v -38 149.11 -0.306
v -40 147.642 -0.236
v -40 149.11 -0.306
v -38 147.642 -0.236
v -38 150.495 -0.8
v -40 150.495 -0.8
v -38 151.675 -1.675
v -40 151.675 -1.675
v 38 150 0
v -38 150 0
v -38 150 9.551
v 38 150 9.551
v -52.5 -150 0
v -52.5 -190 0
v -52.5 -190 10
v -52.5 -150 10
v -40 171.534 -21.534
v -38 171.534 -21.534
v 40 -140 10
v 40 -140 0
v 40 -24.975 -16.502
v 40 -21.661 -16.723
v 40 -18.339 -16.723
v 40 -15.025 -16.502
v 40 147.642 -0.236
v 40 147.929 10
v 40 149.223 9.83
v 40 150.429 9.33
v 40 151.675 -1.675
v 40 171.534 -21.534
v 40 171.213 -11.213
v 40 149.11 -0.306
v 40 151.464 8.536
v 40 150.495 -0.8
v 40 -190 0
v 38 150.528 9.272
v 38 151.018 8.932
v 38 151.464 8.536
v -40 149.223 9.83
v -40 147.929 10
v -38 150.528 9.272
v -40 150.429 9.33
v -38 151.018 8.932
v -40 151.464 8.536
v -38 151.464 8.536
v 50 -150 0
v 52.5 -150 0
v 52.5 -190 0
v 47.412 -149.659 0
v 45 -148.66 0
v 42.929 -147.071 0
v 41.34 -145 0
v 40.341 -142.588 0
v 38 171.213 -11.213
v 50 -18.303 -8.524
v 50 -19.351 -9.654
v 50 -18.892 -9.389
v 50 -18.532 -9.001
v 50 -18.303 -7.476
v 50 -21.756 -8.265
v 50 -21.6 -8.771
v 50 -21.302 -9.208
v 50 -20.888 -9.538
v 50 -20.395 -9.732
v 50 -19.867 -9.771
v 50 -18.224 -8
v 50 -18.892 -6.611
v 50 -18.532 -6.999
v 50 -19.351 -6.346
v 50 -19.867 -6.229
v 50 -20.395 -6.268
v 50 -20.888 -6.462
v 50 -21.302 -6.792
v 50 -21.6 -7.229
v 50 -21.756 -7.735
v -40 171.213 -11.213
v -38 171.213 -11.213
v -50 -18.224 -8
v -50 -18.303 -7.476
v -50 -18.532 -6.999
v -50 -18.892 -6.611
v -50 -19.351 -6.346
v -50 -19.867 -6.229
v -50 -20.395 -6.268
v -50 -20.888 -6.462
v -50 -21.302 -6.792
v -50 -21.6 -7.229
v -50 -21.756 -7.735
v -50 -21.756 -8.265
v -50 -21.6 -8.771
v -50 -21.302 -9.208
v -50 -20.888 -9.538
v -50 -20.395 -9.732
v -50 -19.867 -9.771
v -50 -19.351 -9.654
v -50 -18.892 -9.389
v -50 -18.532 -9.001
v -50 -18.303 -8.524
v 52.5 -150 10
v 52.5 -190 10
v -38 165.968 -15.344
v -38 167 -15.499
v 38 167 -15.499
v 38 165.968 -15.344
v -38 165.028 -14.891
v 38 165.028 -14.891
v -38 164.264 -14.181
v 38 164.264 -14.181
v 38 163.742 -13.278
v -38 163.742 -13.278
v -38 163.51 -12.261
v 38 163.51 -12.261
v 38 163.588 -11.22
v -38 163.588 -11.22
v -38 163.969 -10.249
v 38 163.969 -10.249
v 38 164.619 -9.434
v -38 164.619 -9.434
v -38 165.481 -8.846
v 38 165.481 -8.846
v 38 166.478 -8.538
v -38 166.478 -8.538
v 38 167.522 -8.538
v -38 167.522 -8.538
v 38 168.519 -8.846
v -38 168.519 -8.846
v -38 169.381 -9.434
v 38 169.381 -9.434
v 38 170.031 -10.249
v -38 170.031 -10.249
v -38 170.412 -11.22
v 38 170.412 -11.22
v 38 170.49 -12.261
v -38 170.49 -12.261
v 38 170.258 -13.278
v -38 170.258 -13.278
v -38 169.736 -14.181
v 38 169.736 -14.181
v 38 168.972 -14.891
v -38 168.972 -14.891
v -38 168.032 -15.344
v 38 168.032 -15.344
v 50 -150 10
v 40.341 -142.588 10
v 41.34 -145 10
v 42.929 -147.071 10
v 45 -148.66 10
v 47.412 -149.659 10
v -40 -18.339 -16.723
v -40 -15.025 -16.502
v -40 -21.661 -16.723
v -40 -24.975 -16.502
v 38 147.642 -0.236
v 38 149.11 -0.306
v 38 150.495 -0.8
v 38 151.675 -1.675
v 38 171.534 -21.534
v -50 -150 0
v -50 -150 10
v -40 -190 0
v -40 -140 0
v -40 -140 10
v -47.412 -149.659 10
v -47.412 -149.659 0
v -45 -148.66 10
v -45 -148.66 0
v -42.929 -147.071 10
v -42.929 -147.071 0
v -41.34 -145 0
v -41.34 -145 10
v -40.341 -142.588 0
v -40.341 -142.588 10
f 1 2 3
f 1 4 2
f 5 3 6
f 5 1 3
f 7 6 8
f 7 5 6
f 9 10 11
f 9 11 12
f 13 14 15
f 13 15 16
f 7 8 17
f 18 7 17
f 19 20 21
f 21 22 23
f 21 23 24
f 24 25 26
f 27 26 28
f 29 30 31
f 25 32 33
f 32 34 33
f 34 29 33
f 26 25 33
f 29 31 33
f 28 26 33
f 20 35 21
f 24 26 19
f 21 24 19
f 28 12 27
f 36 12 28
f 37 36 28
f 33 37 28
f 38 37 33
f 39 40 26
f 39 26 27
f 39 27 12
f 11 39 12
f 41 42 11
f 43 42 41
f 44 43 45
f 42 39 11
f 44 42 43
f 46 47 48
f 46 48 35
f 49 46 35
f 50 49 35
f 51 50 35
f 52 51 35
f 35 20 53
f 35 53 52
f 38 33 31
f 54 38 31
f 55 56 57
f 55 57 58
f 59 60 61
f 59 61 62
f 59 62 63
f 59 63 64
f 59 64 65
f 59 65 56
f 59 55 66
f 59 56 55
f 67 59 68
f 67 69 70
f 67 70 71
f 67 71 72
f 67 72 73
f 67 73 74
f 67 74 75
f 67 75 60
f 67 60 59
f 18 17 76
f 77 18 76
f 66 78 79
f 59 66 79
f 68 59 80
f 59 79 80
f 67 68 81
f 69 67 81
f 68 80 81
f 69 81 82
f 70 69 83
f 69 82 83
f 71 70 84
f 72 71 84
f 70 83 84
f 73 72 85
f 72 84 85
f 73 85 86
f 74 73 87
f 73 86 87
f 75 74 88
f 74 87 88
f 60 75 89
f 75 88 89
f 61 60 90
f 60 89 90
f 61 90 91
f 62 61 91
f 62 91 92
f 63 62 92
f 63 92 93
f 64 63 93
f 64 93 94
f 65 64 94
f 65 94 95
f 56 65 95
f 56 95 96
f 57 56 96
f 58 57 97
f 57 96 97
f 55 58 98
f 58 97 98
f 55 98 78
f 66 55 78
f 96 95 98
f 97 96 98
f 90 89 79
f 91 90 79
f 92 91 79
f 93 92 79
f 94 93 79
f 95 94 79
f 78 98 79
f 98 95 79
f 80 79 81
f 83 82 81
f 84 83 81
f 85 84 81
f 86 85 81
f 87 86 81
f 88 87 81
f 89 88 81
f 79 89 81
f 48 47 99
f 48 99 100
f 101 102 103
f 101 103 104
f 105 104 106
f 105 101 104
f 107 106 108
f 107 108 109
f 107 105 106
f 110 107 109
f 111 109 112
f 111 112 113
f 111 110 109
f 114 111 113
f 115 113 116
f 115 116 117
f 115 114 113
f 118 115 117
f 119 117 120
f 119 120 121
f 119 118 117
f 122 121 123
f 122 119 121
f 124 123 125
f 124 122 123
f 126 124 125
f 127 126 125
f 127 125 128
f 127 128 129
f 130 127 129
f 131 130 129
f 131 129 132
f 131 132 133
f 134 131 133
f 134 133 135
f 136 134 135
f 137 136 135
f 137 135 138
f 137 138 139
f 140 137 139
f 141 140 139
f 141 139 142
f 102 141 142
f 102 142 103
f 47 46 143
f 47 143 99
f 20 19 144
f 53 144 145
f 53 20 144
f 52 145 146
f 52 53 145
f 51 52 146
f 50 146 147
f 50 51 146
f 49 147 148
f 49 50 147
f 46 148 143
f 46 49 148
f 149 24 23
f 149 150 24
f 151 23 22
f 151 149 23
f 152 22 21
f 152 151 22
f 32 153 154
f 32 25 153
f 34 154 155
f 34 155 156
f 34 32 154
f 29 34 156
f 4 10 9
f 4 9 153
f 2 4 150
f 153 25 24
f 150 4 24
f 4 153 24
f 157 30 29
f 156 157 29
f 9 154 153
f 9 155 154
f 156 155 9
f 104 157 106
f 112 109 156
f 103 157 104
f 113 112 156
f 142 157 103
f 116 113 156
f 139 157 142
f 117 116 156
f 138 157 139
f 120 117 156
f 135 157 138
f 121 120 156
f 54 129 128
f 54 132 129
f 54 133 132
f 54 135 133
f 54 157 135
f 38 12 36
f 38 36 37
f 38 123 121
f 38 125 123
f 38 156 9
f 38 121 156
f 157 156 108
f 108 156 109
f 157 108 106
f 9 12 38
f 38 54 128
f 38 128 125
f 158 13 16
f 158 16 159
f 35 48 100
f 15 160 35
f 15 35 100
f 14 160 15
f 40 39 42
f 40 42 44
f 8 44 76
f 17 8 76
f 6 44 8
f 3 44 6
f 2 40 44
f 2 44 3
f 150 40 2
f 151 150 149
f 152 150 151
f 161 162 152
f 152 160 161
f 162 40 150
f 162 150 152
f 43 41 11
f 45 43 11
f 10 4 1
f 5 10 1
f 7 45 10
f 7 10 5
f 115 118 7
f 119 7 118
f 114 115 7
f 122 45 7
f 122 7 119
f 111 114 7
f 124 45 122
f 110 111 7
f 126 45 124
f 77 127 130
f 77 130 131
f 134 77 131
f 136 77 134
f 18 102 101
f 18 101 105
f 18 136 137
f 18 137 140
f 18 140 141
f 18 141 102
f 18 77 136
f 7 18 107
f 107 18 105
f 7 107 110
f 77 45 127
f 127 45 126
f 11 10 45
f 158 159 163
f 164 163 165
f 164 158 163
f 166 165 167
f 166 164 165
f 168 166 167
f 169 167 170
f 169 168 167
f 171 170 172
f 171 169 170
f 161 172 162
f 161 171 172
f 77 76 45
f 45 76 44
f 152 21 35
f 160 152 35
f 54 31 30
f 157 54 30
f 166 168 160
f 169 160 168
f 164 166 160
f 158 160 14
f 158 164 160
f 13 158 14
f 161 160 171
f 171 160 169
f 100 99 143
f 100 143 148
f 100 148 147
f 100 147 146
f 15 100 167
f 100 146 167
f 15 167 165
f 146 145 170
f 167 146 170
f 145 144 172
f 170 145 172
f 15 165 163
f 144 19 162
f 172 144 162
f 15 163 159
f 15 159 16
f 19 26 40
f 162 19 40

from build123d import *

# Parameters (mm, degrees)
BOSS_EXTRUDE1_DEPTH      = 10
BOSS_EXTRUDE2_DEPTH      = 10
BOSS_EXTRUDE2_DEPTH_BACK = 90
SKETCH2_R                = 1.776294634
BOSS_EXTRUDE3_DEPTH      = 80
FILLET1_R                = 50
BOSS_EXTRUDE6_DEPTH      = 2
BOSS_EXTRUDE7_DEPTH      = 2
SKETCH7_R                = 3.5
BOSS_EXTRUDE8_DEPTH      = 80
FILLET2_START            = -41
FILLET2_DEPTH            = 82
FILLET3_R                = 5
FILLET4_R                = 5


with BuildPart() as part:
    # Sketch1 → Boss-Extrude1 (new body)
    with BuildSketch(Plane.XY):
        with BuildLine():
            Line((50, -150), (52.5, -150))
            Line((52.5, -150), (52.5, -190))
            Line((52.5, -190), (-52.5, -190))
            Line((-52.5, -190), (-52.5, -150))
            Line((-52.5, -150), (-50, -150))
            ThreePointArc((-50, -150), (-42.928932188, -147.071067812), (-40, -140))
            Line((-40, -140), (-40, 150))
            Line((-40, 150), (40, 150))
            Line((40, 150), (40, -140))
            ThreePointArc((40, -140), (42.928932188, -147.071067812), (50, -150))
        make_face()
    extrude(amount=BOSS_EXTRUDE1_DEPTH)

    # Sketch3 → Boss-Extrude3 (add)
    with BuildSketch(Plane(origin=(40, 0, 0), x_dir=(0, 0, -1), z_dir=(1, 0, 0))):
        Polygon((0, 150), (17, -20), (0, -190), align=None)
    extrude(amount=-BOSS_EXTRUDE3_DEPTH)

    # Fillet1
    fillet1_edges = [part.edges().sort_by_distance(p)[0] for p in [
        (0, -20, -17),
    ]]
    fillet(fillet1_edges, radius=FILLET1_R)

    # Sketch6 → Boss-Extrude7 (add)
    with BuildSketch(Plane.ZY.offset(40)):
        Polygon((10, 150), (0, 150), (-21.533549548, 171.533549548), (-11.213203436, 171.213203436), align=None)
    extrude(amount=-BOSS_EXTRUDE7_DEPTH)



with BuildPart() as body_2:
    # Sketch2 → Boss-Extrude2 (new, two sides: drawn at the far end of the back side and taken through both)
    with BuildSketch(Plane(origin=(40, 0, 0), x_dir=(0, 0, -1), z_dir=(1, 0, 0)).offset(-BOSS_EXTRUDE2_DEPTH_BACK)):
        with Locations(Location((8, -20, 0), (0, 0, 90))):
            Circle(SKETCH2_R)
    extrude(amount=BOSS_EXTRUDE2_DEPTH + BOSS_EXTRUDE2_DEPTH_BACK)


with BuildPart() as body_3:
    # Sketch5 → Boss-Extrude6 (new body)
    with BuildSketch(Plane(origin=(40, 0, 0), x_dir=(0, 0, -1), z_dir=(1, 0, 0))):
        Polygon((0, 150), (-10, 150), (11.213203436, 171.213203436), (21.533549548, 171.533549548), align=None)
    extrude(amount=-BOSS_EXTRUDE6_DEPTH)


with BuildPart() as part_1:
    add(part.part)

    add(body_3.part)  # Boss-Extrude8 merges body 3
    # Sketch7 → Boss-Extrude8 (add)
    with BuildSketch(Plane.ZY.offset(40)):
        with Locations(Location((-11.999244943, 167, 0), (0, 0, 180))):
            Circle(SKETCH7_R)
    extrude(amount=-BOSS_EXTRUDE8_DEPTH)

    # Fillet2: read off the stored shape, not the designer's step
    # Fillet2 outline → Fillet2 (cut)
    with BuildSketch(Plane.YZ.offset(FILLET2_START)):
        with BuildLine():
            Line((150, 10), (147.928932188, 10))
            ThreePointArc((147.928932188, 10), (149.84234935, 9.619397663), (151.464466094, 8.535533906))
            Line((151.464466094, 8.535533906), (150, 10))
        make_face()
    extrude(amount=FILLET2_DEPTH, mode=Mode.SUBTRACT)

    # Fillet3
    fillet3_edges = [part_1.edges().sort_by_distance(p)[0] for p in [
        (39, 150, 0),
    ]]
    fillet(fillet3_edges, radius=FILLET3_R)

    # Fillet4
    fillet4_edges = [part_1.edges().sort_by_distance(p)[0] for p in [
        (-39, 150, 0),
    ]]
    fillet(fillet4_edges, radius=FILLET4_R)


solid = Compound([body_2.part, part_1.part])
